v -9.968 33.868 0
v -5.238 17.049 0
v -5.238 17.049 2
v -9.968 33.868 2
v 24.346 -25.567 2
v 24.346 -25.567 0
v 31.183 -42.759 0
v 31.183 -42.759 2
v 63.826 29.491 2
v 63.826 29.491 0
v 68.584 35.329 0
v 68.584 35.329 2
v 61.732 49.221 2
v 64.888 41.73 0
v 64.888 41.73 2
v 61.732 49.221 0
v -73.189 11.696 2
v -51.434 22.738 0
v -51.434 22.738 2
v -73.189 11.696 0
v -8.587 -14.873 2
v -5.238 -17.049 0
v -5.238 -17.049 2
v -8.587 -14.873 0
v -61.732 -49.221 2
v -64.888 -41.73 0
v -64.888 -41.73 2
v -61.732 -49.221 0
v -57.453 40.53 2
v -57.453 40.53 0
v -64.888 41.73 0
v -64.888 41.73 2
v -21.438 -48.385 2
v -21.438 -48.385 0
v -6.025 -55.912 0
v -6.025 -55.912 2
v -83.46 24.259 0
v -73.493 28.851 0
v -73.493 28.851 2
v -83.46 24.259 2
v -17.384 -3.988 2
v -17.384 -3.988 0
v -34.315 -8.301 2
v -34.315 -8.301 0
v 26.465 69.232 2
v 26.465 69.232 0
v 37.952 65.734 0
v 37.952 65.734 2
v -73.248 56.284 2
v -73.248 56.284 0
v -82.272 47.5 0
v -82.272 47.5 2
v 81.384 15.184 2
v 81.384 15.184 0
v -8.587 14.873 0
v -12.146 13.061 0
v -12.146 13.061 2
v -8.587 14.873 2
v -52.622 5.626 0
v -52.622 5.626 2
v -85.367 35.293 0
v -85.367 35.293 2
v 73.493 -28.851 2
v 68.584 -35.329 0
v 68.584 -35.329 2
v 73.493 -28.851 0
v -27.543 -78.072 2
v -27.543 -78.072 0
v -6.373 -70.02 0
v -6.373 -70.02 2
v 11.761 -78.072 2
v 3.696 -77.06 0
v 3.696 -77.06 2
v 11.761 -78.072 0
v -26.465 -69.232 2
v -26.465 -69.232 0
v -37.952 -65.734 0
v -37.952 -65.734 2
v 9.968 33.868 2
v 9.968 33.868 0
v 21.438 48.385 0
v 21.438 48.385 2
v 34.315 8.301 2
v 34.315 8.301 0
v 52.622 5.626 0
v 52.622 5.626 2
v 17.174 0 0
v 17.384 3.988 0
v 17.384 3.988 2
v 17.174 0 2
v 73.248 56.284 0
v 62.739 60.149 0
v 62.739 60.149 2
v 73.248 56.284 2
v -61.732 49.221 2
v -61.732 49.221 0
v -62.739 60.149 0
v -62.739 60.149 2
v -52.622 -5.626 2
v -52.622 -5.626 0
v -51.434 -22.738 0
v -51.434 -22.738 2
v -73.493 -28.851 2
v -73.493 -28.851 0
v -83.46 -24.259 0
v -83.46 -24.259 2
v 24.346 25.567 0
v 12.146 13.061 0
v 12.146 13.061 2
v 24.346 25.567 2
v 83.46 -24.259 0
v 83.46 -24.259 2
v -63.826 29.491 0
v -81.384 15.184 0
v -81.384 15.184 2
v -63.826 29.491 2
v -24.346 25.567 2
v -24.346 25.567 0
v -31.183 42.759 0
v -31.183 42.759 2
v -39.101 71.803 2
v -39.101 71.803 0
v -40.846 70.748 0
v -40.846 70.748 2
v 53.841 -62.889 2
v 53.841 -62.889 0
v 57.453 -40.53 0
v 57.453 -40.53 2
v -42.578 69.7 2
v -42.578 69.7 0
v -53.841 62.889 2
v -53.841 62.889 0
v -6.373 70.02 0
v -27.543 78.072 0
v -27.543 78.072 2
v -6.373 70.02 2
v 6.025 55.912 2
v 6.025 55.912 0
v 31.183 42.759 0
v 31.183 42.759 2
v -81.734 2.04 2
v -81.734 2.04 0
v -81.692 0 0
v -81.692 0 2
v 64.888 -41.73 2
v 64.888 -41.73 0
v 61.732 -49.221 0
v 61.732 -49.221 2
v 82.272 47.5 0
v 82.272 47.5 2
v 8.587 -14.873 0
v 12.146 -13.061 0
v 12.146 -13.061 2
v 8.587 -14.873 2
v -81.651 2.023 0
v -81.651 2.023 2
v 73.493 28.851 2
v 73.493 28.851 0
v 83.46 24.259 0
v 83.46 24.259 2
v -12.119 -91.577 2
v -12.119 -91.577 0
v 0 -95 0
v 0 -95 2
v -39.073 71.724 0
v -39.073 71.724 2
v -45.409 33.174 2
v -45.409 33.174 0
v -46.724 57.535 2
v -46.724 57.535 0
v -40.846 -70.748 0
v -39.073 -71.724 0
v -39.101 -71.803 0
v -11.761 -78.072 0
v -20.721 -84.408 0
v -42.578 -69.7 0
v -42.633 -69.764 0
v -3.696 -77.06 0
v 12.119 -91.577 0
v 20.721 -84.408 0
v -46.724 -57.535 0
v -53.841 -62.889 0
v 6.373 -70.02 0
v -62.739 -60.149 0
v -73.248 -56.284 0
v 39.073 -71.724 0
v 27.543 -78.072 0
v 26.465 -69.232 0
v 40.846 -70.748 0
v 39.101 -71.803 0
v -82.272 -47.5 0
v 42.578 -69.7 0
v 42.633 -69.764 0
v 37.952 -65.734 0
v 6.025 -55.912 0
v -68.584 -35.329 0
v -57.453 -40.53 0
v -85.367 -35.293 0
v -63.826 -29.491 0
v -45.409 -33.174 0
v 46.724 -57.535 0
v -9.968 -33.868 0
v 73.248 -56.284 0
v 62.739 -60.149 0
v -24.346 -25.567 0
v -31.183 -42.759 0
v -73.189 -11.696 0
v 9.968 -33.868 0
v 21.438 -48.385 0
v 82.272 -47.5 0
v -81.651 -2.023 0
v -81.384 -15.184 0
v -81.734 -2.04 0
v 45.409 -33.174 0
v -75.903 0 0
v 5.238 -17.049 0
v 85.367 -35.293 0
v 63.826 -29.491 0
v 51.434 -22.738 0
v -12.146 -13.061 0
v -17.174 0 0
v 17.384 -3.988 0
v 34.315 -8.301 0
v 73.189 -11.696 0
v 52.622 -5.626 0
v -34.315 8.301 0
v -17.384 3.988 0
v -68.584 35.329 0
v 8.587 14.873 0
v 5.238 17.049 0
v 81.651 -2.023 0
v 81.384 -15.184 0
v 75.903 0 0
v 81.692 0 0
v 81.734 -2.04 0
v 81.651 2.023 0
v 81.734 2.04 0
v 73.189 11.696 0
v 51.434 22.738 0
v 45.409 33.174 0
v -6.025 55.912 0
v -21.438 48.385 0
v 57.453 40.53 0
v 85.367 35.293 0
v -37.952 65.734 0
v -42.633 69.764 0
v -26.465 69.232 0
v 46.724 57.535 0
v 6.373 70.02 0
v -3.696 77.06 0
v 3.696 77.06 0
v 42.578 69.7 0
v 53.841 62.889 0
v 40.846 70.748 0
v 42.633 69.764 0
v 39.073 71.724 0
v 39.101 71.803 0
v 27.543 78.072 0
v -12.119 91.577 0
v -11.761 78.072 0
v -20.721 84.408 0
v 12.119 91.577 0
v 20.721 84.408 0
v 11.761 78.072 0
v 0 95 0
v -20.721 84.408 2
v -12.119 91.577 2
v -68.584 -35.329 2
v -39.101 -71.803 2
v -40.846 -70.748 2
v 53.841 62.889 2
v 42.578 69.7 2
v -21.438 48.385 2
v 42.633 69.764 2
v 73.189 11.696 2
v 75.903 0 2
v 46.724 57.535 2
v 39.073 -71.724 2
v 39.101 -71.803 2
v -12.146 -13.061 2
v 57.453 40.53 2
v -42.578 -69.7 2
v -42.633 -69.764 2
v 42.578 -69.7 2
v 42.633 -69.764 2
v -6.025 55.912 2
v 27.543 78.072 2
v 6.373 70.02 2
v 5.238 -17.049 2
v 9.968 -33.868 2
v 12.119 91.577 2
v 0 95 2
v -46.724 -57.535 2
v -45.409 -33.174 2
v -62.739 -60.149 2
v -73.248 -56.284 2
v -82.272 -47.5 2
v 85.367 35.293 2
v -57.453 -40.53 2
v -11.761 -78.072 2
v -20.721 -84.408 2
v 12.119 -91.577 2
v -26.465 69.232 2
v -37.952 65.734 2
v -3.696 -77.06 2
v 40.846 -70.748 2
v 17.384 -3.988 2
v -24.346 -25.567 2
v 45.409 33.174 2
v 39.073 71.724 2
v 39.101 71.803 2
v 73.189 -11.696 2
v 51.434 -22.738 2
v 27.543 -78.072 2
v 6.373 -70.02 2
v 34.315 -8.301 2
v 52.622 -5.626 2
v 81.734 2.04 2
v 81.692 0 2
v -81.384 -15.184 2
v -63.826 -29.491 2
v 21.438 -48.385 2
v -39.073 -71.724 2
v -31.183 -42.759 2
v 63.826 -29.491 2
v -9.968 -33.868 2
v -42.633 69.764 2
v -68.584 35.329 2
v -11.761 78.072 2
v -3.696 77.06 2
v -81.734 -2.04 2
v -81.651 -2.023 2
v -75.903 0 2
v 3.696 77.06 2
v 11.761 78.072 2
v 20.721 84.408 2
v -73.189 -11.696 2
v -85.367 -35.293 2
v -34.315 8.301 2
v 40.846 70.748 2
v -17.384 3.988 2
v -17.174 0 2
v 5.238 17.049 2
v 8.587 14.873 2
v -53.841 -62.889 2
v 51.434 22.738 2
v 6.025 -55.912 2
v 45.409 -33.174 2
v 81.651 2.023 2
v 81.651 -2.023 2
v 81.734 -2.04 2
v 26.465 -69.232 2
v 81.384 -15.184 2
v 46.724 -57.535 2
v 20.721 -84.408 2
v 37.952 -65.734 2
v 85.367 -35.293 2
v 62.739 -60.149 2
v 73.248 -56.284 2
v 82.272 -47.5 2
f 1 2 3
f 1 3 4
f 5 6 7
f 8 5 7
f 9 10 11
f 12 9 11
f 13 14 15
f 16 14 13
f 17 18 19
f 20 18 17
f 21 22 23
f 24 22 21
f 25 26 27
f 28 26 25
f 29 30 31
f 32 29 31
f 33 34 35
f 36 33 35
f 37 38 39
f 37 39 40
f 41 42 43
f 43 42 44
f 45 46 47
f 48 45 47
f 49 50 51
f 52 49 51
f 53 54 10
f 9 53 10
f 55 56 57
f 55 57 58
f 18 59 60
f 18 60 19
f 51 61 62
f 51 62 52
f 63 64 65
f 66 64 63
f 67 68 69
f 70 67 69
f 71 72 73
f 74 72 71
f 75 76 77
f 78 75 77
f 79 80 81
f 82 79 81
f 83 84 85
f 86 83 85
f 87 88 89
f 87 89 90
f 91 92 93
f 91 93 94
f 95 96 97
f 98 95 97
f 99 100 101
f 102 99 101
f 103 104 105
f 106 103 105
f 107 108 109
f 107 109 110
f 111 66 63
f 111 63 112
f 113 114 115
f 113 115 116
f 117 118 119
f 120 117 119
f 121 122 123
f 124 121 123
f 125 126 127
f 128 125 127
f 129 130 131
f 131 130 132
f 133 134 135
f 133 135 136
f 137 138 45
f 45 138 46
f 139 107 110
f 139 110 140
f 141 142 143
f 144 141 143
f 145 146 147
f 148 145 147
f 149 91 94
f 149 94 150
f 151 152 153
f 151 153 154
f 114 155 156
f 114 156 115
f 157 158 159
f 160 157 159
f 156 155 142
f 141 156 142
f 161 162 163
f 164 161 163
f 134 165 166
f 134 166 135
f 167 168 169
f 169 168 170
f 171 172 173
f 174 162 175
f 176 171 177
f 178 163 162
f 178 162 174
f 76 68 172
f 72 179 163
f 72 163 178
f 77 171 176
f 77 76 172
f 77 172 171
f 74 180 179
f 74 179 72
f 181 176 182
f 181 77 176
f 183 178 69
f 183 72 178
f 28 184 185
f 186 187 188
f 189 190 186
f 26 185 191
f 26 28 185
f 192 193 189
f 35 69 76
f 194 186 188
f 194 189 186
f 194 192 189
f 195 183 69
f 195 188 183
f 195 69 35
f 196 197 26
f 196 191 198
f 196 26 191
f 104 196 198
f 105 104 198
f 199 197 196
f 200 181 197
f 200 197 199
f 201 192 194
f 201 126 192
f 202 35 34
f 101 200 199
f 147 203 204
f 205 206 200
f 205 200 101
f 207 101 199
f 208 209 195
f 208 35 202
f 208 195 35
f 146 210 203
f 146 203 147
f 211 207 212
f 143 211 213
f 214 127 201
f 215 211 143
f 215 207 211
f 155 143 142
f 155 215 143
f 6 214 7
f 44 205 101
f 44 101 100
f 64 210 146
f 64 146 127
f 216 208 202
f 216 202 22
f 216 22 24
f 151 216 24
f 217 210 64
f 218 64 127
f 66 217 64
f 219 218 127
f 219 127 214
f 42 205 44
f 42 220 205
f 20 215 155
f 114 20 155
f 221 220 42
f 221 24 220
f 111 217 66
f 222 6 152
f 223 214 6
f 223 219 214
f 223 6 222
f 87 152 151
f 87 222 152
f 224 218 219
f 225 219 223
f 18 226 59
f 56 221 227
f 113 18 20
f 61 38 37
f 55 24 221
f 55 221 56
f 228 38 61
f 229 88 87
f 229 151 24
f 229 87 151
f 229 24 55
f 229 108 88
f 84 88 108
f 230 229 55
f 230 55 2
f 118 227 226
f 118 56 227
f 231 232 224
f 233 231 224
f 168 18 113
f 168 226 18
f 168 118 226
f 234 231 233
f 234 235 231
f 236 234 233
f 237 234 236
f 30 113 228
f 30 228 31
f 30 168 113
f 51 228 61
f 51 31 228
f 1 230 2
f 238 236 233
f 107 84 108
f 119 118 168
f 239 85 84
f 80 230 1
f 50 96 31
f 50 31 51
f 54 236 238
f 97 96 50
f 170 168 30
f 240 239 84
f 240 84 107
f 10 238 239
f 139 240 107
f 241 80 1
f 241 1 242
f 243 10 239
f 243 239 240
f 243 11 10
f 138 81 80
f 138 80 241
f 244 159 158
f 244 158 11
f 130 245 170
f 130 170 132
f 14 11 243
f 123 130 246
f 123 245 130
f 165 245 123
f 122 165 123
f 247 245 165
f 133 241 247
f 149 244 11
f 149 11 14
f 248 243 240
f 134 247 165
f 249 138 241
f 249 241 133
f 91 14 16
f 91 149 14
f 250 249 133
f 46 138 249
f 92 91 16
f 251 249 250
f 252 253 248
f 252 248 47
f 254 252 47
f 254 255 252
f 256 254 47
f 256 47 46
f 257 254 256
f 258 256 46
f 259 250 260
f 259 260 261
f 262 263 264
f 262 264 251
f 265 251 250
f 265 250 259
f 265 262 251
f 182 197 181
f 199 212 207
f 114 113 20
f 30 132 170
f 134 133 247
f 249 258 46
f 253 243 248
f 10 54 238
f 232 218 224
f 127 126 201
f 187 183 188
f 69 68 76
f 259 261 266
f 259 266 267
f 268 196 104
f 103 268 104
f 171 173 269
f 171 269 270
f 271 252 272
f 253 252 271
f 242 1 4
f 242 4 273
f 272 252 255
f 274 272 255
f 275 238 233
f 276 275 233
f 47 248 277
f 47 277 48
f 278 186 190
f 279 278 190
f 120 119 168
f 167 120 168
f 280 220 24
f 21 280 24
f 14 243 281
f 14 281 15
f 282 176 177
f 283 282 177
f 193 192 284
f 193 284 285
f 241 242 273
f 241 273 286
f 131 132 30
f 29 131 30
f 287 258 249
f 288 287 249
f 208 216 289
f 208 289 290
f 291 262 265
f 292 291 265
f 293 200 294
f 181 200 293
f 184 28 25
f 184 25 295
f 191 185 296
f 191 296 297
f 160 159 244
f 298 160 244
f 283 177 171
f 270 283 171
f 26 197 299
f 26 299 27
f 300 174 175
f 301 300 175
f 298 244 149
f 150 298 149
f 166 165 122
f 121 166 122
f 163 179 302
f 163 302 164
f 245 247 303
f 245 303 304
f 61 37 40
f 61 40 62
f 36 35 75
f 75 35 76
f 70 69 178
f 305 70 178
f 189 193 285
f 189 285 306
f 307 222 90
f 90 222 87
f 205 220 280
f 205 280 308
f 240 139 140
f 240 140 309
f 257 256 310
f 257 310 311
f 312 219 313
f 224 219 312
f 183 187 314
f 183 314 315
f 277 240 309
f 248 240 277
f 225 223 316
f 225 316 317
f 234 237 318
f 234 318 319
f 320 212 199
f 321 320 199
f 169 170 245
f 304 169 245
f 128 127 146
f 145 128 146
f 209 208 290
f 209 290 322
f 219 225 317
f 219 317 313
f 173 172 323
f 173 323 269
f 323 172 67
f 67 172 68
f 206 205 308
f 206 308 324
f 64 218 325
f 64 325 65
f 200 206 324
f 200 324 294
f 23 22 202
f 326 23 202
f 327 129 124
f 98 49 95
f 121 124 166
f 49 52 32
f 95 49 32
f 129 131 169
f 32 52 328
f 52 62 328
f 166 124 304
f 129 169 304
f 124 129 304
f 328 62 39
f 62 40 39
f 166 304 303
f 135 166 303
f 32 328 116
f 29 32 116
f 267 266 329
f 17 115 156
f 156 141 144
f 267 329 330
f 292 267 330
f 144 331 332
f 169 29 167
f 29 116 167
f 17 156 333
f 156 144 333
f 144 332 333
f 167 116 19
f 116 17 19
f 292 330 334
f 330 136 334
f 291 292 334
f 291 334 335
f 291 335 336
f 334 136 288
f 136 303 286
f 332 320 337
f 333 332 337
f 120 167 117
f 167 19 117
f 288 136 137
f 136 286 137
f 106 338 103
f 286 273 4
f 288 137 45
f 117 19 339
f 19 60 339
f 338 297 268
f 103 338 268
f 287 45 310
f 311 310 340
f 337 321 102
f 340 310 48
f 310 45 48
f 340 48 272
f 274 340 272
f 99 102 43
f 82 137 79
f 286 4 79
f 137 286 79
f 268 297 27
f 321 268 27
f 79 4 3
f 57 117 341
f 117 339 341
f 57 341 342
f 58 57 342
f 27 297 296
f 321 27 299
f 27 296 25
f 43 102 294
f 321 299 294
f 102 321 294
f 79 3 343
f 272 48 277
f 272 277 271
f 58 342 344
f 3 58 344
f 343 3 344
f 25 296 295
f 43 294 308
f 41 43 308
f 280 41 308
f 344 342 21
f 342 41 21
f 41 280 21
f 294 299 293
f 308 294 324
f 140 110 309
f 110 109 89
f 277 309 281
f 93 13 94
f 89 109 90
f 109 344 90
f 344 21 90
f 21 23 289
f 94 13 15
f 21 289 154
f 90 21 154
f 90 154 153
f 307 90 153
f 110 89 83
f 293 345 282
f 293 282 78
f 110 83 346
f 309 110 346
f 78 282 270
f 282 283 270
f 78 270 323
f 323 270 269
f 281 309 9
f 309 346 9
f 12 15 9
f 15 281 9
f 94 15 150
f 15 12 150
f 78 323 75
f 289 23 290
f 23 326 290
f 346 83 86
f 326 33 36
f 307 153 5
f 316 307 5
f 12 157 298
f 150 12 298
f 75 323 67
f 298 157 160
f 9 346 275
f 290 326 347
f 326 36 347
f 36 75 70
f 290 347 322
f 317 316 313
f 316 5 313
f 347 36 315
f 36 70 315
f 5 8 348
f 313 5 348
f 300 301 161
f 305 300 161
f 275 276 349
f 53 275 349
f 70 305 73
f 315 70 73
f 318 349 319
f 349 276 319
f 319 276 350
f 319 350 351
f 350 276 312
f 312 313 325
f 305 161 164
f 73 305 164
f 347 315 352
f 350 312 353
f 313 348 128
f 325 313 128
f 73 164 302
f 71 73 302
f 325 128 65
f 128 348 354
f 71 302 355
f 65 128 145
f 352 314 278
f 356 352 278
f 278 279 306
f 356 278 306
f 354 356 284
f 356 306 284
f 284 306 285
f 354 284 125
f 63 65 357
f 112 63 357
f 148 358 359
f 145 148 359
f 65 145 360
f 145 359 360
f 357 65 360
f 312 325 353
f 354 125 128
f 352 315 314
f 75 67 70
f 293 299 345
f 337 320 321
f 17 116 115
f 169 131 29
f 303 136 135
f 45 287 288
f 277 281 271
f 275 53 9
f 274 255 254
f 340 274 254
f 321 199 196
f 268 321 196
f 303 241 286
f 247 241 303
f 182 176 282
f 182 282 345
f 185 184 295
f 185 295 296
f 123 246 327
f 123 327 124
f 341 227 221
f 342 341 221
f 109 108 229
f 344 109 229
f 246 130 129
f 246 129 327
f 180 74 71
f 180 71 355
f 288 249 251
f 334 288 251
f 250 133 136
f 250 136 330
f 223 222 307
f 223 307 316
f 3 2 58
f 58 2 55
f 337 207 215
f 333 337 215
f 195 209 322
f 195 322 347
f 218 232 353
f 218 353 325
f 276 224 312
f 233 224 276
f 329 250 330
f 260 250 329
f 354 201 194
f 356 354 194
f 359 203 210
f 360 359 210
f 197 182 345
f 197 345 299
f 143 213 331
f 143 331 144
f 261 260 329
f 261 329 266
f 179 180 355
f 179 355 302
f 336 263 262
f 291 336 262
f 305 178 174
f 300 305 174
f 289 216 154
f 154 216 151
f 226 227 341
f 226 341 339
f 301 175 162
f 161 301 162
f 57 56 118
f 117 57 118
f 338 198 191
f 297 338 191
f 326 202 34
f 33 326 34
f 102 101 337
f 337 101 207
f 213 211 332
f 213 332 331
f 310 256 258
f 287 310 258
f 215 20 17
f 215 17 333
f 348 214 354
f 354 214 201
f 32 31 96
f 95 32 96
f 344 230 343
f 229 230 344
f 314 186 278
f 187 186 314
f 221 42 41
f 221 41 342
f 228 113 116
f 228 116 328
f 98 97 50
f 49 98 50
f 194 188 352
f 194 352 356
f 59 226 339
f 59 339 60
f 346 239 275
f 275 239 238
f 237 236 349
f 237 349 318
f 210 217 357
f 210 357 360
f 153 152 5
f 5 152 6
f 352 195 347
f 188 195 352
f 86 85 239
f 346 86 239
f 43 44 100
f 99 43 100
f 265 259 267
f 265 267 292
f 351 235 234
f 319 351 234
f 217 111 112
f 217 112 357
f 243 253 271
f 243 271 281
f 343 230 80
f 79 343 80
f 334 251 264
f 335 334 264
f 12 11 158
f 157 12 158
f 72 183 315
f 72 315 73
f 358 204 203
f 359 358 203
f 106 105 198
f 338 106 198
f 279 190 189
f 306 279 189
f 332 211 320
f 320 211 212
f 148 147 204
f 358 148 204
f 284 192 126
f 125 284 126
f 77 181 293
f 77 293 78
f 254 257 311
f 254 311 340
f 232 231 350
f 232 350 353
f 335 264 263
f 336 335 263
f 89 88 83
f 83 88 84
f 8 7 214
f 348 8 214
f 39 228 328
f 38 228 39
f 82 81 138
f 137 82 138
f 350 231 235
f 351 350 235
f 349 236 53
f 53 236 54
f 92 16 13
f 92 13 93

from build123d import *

# Parameters (mm, degrees)
F1_DEPTH = 2
F4_COUNT = 6
F4_ANGLE = 300


with BuildPart() as f1:
    # F0 (on Top) → F1 (new body)
    with BuildSketch(Plane.XY):
        Polygon((0, 95), (0, 0), (9.0951109305, 0), (15.0057672536, 11.6038580467), (5.1223551854, 16.6381709278), (9.968268685, 33.868085593), (21.4383043349, 48.3848489821), (6.0254437849, 55.9120550752), (26.4652259648, 69.2315325141), (38.8642698526, 65.456263721), (42.6333136857, 69.7637423873), (27.5425929576, 78.0722051859), (6.3733253418, 70.0200916975), (3.6955948453, 77.0599320531), (11.7607787251, 78.0722051859), (20.7214262336, 84.4079181552), (12.1189001948, 91.5766954422), align=None)
    extrude(amount=F1_DEPTH)

    # F2: F1 across plane


with BuildPart() as f1_1:
    add(f1.part)
    add(f1.part.mirror(Plane.YZ))

    # F4: F1 ×6 about axis
    f4_axis = Axis((0, 0, 4.1130185127), (0, 0, 1))


with BuildPart() as f1_2:
    add(f1_1.part)
    for i in range(1, F4_COUNT):
        add(f1_1.part.rotate(f4_axis, i * F4_ANGLE / (F4_COUNT - 1)))


solid = f1_2.part
